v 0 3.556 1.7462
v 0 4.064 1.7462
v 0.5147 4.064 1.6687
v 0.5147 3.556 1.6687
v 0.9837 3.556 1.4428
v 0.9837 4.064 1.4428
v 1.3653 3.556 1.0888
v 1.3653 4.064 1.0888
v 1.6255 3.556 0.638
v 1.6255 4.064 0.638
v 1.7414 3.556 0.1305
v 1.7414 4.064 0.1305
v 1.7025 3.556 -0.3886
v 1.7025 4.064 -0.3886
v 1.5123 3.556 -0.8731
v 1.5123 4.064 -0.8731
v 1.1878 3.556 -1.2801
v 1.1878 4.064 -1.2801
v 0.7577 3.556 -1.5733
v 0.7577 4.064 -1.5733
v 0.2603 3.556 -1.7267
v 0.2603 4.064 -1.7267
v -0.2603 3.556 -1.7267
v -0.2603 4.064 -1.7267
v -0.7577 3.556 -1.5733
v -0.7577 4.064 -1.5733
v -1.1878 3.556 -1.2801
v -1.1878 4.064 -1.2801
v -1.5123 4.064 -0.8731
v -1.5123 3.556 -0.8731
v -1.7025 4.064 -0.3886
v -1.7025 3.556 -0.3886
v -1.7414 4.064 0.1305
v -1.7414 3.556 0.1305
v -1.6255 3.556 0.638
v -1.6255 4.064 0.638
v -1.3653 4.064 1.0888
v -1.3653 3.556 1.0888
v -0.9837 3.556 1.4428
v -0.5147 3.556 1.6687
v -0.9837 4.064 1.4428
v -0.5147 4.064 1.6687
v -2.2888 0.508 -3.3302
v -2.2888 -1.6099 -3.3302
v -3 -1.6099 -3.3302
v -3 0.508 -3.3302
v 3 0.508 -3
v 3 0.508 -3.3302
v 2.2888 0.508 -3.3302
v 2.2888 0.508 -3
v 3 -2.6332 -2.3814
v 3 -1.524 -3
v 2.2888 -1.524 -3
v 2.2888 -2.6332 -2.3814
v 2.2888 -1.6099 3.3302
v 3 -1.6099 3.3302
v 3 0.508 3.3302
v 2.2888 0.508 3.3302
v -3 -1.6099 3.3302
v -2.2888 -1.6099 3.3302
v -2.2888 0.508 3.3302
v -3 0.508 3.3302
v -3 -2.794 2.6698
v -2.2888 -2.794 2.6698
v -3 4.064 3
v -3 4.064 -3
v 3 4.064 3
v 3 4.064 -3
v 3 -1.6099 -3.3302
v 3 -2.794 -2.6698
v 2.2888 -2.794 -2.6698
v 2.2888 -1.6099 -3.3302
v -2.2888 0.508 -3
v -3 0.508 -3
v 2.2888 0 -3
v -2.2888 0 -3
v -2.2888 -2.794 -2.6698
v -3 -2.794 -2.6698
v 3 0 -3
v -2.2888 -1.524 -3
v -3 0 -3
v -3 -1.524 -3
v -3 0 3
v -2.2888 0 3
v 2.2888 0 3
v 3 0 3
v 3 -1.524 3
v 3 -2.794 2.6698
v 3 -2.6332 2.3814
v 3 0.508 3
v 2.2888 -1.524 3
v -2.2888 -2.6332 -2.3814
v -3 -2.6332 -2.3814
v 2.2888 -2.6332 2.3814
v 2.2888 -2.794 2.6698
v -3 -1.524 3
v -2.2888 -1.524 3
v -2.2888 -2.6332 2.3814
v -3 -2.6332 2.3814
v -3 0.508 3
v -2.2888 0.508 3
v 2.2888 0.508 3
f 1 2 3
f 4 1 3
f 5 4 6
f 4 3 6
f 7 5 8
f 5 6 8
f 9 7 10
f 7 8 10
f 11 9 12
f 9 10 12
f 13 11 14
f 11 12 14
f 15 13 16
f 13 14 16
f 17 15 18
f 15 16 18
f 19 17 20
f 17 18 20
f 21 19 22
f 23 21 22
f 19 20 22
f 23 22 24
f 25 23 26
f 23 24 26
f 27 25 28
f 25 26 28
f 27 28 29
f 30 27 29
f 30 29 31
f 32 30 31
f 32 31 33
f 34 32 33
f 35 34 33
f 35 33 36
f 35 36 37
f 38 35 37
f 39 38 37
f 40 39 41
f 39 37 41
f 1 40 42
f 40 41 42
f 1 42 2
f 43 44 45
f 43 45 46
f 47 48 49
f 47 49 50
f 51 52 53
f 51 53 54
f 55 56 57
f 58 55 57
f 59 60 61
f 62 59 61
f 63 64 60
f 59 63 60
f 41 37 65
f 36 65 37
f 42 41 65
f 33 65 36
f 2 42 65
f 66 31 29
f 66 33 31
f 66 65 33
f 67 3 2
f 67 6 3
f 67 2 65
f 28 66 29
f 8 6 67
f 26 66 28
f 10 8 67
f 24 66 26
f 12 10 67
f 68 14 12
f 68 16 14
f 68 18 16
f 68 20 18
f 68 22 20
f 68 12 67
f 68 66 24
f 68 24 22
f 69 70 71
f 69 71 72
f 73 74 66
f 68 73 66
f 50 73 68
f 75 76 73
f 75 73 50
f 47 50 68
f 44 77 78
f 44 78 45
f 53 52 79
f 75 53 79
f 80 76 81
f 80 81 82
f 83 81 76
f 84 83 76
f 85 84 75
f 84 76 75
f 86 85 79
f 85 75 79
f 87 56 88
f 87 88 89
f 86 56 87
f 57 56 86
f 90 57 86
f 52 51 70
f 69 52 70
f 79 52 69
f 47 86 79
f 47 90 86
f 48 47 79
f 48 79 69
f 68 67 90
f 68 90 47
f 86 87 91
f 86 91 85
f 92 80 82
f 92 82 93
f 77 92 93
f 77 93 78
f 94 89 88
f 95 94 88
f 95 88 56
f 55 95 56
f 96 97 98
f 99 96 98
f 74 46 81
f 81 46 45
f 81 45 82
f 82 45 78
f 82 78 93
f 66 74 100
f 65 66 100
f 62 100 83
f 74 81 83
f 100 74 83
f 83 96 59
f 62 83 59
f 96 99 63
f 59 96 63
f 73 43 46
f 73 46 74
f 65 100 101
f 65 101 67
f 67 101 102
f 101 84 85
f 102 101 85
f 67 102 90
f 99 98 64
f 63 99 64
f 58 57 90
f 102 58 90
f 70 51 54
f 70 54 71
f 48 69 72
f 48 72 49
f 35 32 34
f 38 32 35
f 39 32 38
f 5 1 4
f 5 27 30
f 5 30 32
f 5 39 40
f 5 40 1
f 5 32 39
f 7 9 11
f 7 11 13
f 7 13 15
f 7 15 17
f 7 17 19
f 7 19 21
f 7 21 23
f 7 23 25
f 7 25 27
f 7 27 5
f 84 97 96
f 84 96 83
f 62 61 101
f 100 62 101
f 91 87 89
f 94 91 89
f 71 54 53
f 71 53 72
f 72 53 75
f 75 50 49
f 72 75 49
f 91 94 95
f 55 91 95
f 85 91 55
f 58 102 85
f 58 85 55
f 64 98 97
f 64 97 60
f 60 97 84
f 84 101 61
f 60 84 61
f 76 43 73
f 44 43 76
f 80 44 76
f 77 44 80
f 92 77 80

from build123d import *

# Parameters (mm, degrees)
SKETCH1_W            = 6
SKETCH1_H            = 6
BOSS_EXTRUDE1_DEPTH  = 4.064
BOSS_EXTRUDE2_DEPTH  = 0.7112
LPATTERN1_COUNT      = 2
LPATTERN1_PITCH      = 5.288799938
MIRROR1_COPY_1_DEPTH = 0.7112
SKETCH3_R            = 1.74625
CUT_EXTRUDE1_DEPTH   = 0.508


with BuildPart() as part:
    # Sketch1 → Boss-Extrude1 (new body)
    with BuildSketch(Plane(origin=(0, 0, 0), x_dir=(1, 0, 0), z_dir=(0, 1, 0))):
        Rectangle(SKETCH1_W, SKETCH1_H)
    extrude(amount=BOSS_EXTRUDE1_DEPTH)

    # Sketch2 → Boss-Extrude2 (add)
    with BuildSketch(Plane(origin=(3, 0, 0), x_dir=(0, 0, -1), z_dir=(1, 0, 0))):
        Polygon((-3, 0), (-3, -1.524), (-2.381416261, -2.633168228), (-2.6698, -2.794), (-3.3302, -1.609852), (-3.3302, 0.508), (-3, 0.508), align=None)
    boss_extrude2 = extrude(amount=-BOSS_EXTRUDE2_DEPTH)

    # LPattern1: Boss-Extrude2 ×2
    with Locations(*[(-i * LPATTERN1_PITCH, 0, 0) for i in range(1, LPATTERN1_COUNT)]):
        add(boss_extrude2)

    # Mirror1: Boss-Extrude2 across plane
    add(boss_extrude2.mirror(Plane.XY))

    # Mirror1 copy 1 sketch → Mirror1 copy 1 (add)
    with BuildSketch(Plane(origin=(-2.288799938, 0, 0), x_dir=(0, 0, 1), z_dir=(1, 0, 0))):
        Polygon((-3, 0), (-3, 1.524), (-2.381416261, 2.633168228), (-2.6698, 2.794), (-3.3302, 1.609852), (-3.3302, -0.508), (-3, -0.508), align=None)
    extrude(amount=-MIRROR1_COPY_1_DEPTH)

    # Sketch3 → Cut-Extrude1 (cut)
    with BuildSketch(Plane(origin=(0, 4.064, 0), x_dir=(1, 0, 0), z_dir=(0, 1, 0))):
        with Locations(Location((0, 0, 0), (0, 0, 270))):
            Circle(SKETCH3_R)
    extrude(amount=-CUT_EXTRUDE1_DEPTH, mode=Mode.SUBTRACT)


solid = part.part
